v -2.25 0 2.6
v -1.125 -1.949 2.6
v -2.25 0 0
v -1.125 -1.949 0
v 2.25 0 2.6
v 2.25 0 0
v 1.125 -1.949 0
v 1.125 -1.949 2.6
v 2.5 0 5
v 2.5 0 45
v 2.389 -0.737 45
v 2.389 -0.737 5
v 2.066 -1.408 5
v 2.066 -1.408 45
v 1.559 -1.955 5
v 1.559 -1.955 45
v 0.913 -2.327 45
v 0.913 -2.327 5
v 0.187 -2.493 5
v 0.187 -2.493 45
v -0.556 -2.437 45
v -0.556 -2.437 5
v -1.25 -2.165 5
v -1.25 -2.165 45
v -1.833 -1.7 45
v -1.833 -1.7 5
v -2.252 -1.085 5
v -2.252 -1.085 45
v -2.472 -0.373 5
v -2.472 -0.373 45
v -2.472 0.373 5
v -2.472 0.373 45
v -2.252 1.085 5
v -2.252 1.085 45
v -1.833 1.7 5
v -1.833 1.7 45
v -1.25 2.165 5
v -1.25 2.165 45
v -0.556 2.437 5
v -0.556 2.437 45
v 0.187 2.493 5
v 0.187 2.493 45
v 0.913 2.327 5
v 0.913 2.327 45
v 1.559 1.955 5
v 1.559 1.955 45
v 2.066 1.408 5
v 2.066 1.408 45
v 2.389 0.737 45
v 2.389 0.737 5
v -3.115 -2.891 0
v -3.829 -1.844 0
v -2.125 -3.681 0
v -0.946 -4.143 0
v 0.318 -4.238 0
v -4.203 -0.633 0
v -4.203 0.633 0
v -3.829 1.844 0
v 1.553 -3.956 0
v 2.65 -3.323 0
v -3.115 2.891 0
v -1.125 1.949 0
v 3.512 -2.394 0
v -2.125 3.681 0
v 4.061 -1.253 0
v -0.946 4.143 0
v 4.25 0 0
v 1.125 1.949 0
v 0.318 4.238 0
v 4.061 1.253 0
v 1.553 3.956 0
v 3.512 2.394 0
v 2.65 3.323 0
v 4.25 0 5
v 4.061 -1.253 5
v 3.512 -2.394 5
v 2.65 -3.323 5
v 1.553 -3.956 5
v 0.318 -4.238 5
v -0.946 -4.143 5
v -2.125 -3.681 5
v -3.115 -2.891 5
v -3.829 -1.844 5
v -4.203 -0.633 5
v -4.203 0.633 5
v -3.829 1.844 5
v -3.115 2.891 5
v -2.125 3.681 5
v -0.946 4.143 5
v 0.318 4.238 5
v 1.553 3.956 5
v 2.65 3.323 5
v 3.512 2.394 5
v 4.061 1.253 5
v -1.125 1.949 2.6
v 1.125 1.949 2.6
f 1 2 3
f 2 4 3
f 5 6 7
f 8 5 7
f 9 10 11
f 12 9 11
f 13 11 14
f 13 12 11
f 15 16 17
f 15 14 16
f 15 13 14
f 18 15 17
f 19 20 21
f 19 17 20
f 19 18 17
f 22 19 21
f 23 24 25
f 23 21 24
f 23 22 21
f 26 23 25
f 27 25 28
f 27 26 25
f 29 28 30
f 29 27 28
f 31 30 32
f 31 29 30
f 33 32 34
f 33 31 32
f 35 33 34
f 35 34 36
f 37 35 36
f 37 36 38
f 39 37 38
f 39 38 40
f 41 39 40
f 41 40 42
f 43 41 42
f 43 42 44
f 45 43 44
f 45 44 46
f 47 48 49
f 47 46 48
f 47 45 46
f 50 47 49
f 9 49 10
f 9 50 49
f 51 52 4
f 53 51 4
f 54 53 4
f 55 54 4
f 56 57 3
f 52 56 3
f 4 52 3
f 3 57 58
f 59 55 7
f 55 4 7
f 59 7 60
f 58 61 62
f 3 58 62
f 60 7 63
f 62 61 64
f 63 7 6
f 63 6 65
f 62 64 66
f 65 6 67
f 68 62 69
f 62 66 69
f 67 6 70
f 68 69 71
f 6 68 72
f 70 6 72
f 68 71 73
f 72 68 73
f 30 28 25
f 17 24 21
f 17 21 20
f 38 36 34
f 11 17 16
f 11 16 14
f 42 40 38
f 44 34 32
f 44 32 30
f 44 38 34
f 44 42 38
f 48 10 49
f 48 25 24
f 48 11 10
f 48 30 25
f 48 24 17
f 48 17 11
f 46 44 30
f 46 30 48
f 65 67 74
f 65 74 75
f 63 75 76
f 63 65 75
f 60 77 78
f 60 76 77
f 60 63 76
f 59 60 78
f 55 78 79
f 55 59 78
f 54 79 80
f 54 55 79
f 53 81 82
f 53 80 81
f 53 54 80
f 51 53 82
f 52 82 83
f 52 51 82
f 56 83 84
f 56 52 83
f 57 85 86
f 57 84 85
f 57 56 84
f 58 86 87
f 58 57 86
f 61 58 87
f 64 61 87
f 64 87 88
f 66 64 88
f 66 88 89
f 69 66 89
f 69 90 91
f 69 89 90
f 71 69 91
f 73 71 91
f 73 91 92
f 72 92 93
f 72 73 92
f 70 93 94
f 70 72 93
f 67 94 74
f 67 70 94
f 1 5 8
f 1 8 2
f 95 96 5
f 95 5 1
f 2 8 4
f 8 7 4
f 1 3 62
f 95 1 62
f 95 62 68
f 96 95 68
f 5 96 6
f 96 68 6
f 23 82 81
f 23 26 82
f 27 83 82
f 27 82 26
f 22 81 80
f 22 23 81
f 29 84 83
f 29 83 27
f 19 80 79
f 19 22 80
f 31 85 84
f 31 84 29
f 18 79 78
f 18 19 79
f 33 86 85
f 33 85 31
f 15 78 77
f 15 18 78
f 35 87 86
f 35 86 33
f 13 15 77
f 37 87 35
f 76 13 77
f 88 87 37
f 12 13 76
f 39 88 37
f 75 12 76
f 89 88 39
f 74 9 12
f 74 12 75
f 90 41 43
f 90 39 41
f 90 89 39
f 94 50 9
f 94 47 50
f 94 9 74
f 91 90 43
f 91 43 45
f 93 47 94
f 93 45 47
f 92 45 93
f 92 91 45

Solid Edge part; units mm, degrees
sketch "Sketch1" plane through (0, 0, 0) normal (0, 0, 1) x (1, 0, 0)
  circle A0 centre (0, 0) radius 4.25
  dimension "D1" = 8.5
extrude "Protrusion1" add sketch "Sketch1" along normal blind 5
sketch "Sketch2" plane through (0, 0, 5) normal (0, 0, 1) x (1, 0, 0)
  circle A0 centre (0, 0) radius 2.5
extrude "ExtrudedProtrusion_2" add sketch "Sketch2" along normal blind 40
sketch "Sketch3" plane through (0, 0, 0) normal (0, 0, -1) x (-1, 0, 0)
  line L0 (2.25, 0) -> (1.125, 1.9486)
  line L1 (1.125, 1.9486) -> (-1.125, 1.9486)
  line L2 (-1.125, 1.9486) -> (-2.25, 0)
  line L3 (-2.25, 0) -> (-1.125, -1.9486)
  line L4 (-1.125, -1.9486) -> (1.125, -1.9486)
  line L5 (1.125, -1.9486) -> (2.25, 0)
extrude "ExtrudedCutout_1" cut sketch "Sketch3" against normal blind 2.6
properties material "Stainless steel"
